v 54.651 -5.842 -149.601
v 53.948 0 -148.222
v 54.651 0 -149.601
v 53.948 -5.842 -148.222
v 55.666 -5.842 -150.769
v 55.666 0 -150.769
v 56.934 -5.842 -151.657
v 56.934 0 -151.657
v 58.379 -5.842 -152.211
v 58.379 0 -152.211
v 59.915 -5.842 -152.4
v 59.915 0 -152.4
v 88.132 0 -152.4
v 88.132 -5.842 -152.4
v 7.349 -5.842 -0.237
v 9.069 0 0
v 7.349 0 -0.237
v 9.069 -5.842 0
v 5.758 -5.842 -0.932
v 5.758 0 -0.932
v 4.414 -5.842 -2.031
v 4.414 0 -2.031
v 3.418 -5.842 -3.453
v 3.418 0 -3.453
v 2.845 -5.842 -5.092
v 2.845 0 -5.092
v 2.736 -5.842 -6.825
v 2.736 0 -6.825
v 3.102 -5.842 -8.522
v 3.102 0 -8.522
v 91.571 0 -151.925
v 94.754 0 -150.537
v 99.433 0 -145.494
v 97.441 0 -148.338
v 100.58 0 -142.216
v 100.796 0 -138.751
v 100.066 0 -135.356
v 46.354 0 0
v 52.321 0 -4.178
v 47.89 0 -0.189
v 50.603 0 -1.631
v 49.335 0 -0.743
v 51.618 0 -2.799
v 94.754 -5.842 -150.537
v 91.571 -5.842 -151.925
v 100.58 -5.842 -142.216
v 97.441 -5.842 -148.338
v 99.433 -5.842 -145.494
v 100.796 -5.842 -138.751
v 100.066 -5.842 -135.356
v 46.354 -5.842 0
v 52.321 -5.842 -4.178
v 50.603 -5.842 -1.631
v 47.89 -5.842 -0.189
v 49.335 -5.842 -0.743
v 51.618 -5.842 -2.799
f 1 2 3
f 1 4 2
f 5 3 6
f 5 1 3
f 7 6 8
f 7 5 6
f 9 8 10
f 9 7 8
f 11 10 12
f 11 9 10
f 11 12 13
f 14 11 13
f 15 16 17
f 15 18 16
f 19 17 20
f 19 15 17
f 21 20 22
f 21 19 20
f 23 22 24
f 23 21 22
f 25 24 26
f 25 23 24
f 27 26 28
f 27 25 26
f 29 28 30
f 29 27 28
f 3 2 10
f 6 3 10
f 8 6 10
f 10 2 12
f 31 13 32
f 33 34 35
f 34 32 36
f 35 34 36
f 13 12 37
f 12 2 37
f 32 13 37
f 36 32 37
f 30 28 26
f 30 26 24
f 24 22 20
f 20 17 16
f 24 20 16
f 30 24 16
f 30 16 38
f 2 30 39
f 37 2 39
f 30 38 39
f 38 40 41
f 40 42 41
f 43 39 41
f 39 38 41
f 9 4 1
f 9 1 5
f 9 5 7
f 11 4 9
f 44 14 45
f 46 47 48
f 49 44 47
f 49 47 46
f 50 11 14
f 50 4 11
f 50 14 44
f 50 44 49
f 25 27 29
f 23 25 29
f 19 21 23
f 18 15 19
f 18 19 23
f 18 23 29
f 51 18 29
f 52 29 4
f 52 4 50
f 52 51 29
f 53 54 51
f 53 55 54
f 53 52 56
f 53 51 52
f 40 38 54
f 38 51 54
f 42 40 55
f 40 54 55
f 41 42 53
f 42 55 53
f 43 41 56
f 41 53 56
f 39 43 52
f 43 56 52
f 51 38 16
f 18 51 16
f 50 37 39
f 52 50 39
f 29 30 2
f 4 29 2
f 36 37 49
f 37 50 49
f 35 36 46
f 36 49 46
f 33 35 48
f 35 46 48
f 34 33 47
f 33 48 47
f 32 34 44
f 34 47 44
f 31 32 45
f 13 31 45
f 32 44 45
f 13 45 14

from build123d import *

# Parameters (mm, degrees)
F1_DEPTH = 5.842
F2_R     = 6.35
F3_R     = 12.7


# Not quite as in the source:
# - a length typed as a fraction of an inch, garbled in the dataset ("3 / 203.2 mm" for 3/8 in), is restored


with BuildPart() as f1:
    # F0 (on Front) → F1 (new body)
    with BuildSketch(Plane.XZ):
        Polygon((50.8, 0), (0, 0), (55.4690637022, -152.4), (106.2690637022, -152.4), align=None)
    extrude(amount=F1_DEPTH)

    # F2
    f2_edges = [f1.edges().sort_by_distance(p)[0] for p in [
        (55.469064, -2.921, -152.4),
        (50.8, -2.921, 0),
        (0, -2.921, 0),
    ]]
    fillet(f2_edges, radius=F2_R)

    # F3
    f3_edges = [f1.edges().sort_by_distance(p)[0] for p in [
        (106.269064, -2.921, -152.4),
    ]]
    fillet(f3_edges, radius=F3_R)


solid = f1.part
